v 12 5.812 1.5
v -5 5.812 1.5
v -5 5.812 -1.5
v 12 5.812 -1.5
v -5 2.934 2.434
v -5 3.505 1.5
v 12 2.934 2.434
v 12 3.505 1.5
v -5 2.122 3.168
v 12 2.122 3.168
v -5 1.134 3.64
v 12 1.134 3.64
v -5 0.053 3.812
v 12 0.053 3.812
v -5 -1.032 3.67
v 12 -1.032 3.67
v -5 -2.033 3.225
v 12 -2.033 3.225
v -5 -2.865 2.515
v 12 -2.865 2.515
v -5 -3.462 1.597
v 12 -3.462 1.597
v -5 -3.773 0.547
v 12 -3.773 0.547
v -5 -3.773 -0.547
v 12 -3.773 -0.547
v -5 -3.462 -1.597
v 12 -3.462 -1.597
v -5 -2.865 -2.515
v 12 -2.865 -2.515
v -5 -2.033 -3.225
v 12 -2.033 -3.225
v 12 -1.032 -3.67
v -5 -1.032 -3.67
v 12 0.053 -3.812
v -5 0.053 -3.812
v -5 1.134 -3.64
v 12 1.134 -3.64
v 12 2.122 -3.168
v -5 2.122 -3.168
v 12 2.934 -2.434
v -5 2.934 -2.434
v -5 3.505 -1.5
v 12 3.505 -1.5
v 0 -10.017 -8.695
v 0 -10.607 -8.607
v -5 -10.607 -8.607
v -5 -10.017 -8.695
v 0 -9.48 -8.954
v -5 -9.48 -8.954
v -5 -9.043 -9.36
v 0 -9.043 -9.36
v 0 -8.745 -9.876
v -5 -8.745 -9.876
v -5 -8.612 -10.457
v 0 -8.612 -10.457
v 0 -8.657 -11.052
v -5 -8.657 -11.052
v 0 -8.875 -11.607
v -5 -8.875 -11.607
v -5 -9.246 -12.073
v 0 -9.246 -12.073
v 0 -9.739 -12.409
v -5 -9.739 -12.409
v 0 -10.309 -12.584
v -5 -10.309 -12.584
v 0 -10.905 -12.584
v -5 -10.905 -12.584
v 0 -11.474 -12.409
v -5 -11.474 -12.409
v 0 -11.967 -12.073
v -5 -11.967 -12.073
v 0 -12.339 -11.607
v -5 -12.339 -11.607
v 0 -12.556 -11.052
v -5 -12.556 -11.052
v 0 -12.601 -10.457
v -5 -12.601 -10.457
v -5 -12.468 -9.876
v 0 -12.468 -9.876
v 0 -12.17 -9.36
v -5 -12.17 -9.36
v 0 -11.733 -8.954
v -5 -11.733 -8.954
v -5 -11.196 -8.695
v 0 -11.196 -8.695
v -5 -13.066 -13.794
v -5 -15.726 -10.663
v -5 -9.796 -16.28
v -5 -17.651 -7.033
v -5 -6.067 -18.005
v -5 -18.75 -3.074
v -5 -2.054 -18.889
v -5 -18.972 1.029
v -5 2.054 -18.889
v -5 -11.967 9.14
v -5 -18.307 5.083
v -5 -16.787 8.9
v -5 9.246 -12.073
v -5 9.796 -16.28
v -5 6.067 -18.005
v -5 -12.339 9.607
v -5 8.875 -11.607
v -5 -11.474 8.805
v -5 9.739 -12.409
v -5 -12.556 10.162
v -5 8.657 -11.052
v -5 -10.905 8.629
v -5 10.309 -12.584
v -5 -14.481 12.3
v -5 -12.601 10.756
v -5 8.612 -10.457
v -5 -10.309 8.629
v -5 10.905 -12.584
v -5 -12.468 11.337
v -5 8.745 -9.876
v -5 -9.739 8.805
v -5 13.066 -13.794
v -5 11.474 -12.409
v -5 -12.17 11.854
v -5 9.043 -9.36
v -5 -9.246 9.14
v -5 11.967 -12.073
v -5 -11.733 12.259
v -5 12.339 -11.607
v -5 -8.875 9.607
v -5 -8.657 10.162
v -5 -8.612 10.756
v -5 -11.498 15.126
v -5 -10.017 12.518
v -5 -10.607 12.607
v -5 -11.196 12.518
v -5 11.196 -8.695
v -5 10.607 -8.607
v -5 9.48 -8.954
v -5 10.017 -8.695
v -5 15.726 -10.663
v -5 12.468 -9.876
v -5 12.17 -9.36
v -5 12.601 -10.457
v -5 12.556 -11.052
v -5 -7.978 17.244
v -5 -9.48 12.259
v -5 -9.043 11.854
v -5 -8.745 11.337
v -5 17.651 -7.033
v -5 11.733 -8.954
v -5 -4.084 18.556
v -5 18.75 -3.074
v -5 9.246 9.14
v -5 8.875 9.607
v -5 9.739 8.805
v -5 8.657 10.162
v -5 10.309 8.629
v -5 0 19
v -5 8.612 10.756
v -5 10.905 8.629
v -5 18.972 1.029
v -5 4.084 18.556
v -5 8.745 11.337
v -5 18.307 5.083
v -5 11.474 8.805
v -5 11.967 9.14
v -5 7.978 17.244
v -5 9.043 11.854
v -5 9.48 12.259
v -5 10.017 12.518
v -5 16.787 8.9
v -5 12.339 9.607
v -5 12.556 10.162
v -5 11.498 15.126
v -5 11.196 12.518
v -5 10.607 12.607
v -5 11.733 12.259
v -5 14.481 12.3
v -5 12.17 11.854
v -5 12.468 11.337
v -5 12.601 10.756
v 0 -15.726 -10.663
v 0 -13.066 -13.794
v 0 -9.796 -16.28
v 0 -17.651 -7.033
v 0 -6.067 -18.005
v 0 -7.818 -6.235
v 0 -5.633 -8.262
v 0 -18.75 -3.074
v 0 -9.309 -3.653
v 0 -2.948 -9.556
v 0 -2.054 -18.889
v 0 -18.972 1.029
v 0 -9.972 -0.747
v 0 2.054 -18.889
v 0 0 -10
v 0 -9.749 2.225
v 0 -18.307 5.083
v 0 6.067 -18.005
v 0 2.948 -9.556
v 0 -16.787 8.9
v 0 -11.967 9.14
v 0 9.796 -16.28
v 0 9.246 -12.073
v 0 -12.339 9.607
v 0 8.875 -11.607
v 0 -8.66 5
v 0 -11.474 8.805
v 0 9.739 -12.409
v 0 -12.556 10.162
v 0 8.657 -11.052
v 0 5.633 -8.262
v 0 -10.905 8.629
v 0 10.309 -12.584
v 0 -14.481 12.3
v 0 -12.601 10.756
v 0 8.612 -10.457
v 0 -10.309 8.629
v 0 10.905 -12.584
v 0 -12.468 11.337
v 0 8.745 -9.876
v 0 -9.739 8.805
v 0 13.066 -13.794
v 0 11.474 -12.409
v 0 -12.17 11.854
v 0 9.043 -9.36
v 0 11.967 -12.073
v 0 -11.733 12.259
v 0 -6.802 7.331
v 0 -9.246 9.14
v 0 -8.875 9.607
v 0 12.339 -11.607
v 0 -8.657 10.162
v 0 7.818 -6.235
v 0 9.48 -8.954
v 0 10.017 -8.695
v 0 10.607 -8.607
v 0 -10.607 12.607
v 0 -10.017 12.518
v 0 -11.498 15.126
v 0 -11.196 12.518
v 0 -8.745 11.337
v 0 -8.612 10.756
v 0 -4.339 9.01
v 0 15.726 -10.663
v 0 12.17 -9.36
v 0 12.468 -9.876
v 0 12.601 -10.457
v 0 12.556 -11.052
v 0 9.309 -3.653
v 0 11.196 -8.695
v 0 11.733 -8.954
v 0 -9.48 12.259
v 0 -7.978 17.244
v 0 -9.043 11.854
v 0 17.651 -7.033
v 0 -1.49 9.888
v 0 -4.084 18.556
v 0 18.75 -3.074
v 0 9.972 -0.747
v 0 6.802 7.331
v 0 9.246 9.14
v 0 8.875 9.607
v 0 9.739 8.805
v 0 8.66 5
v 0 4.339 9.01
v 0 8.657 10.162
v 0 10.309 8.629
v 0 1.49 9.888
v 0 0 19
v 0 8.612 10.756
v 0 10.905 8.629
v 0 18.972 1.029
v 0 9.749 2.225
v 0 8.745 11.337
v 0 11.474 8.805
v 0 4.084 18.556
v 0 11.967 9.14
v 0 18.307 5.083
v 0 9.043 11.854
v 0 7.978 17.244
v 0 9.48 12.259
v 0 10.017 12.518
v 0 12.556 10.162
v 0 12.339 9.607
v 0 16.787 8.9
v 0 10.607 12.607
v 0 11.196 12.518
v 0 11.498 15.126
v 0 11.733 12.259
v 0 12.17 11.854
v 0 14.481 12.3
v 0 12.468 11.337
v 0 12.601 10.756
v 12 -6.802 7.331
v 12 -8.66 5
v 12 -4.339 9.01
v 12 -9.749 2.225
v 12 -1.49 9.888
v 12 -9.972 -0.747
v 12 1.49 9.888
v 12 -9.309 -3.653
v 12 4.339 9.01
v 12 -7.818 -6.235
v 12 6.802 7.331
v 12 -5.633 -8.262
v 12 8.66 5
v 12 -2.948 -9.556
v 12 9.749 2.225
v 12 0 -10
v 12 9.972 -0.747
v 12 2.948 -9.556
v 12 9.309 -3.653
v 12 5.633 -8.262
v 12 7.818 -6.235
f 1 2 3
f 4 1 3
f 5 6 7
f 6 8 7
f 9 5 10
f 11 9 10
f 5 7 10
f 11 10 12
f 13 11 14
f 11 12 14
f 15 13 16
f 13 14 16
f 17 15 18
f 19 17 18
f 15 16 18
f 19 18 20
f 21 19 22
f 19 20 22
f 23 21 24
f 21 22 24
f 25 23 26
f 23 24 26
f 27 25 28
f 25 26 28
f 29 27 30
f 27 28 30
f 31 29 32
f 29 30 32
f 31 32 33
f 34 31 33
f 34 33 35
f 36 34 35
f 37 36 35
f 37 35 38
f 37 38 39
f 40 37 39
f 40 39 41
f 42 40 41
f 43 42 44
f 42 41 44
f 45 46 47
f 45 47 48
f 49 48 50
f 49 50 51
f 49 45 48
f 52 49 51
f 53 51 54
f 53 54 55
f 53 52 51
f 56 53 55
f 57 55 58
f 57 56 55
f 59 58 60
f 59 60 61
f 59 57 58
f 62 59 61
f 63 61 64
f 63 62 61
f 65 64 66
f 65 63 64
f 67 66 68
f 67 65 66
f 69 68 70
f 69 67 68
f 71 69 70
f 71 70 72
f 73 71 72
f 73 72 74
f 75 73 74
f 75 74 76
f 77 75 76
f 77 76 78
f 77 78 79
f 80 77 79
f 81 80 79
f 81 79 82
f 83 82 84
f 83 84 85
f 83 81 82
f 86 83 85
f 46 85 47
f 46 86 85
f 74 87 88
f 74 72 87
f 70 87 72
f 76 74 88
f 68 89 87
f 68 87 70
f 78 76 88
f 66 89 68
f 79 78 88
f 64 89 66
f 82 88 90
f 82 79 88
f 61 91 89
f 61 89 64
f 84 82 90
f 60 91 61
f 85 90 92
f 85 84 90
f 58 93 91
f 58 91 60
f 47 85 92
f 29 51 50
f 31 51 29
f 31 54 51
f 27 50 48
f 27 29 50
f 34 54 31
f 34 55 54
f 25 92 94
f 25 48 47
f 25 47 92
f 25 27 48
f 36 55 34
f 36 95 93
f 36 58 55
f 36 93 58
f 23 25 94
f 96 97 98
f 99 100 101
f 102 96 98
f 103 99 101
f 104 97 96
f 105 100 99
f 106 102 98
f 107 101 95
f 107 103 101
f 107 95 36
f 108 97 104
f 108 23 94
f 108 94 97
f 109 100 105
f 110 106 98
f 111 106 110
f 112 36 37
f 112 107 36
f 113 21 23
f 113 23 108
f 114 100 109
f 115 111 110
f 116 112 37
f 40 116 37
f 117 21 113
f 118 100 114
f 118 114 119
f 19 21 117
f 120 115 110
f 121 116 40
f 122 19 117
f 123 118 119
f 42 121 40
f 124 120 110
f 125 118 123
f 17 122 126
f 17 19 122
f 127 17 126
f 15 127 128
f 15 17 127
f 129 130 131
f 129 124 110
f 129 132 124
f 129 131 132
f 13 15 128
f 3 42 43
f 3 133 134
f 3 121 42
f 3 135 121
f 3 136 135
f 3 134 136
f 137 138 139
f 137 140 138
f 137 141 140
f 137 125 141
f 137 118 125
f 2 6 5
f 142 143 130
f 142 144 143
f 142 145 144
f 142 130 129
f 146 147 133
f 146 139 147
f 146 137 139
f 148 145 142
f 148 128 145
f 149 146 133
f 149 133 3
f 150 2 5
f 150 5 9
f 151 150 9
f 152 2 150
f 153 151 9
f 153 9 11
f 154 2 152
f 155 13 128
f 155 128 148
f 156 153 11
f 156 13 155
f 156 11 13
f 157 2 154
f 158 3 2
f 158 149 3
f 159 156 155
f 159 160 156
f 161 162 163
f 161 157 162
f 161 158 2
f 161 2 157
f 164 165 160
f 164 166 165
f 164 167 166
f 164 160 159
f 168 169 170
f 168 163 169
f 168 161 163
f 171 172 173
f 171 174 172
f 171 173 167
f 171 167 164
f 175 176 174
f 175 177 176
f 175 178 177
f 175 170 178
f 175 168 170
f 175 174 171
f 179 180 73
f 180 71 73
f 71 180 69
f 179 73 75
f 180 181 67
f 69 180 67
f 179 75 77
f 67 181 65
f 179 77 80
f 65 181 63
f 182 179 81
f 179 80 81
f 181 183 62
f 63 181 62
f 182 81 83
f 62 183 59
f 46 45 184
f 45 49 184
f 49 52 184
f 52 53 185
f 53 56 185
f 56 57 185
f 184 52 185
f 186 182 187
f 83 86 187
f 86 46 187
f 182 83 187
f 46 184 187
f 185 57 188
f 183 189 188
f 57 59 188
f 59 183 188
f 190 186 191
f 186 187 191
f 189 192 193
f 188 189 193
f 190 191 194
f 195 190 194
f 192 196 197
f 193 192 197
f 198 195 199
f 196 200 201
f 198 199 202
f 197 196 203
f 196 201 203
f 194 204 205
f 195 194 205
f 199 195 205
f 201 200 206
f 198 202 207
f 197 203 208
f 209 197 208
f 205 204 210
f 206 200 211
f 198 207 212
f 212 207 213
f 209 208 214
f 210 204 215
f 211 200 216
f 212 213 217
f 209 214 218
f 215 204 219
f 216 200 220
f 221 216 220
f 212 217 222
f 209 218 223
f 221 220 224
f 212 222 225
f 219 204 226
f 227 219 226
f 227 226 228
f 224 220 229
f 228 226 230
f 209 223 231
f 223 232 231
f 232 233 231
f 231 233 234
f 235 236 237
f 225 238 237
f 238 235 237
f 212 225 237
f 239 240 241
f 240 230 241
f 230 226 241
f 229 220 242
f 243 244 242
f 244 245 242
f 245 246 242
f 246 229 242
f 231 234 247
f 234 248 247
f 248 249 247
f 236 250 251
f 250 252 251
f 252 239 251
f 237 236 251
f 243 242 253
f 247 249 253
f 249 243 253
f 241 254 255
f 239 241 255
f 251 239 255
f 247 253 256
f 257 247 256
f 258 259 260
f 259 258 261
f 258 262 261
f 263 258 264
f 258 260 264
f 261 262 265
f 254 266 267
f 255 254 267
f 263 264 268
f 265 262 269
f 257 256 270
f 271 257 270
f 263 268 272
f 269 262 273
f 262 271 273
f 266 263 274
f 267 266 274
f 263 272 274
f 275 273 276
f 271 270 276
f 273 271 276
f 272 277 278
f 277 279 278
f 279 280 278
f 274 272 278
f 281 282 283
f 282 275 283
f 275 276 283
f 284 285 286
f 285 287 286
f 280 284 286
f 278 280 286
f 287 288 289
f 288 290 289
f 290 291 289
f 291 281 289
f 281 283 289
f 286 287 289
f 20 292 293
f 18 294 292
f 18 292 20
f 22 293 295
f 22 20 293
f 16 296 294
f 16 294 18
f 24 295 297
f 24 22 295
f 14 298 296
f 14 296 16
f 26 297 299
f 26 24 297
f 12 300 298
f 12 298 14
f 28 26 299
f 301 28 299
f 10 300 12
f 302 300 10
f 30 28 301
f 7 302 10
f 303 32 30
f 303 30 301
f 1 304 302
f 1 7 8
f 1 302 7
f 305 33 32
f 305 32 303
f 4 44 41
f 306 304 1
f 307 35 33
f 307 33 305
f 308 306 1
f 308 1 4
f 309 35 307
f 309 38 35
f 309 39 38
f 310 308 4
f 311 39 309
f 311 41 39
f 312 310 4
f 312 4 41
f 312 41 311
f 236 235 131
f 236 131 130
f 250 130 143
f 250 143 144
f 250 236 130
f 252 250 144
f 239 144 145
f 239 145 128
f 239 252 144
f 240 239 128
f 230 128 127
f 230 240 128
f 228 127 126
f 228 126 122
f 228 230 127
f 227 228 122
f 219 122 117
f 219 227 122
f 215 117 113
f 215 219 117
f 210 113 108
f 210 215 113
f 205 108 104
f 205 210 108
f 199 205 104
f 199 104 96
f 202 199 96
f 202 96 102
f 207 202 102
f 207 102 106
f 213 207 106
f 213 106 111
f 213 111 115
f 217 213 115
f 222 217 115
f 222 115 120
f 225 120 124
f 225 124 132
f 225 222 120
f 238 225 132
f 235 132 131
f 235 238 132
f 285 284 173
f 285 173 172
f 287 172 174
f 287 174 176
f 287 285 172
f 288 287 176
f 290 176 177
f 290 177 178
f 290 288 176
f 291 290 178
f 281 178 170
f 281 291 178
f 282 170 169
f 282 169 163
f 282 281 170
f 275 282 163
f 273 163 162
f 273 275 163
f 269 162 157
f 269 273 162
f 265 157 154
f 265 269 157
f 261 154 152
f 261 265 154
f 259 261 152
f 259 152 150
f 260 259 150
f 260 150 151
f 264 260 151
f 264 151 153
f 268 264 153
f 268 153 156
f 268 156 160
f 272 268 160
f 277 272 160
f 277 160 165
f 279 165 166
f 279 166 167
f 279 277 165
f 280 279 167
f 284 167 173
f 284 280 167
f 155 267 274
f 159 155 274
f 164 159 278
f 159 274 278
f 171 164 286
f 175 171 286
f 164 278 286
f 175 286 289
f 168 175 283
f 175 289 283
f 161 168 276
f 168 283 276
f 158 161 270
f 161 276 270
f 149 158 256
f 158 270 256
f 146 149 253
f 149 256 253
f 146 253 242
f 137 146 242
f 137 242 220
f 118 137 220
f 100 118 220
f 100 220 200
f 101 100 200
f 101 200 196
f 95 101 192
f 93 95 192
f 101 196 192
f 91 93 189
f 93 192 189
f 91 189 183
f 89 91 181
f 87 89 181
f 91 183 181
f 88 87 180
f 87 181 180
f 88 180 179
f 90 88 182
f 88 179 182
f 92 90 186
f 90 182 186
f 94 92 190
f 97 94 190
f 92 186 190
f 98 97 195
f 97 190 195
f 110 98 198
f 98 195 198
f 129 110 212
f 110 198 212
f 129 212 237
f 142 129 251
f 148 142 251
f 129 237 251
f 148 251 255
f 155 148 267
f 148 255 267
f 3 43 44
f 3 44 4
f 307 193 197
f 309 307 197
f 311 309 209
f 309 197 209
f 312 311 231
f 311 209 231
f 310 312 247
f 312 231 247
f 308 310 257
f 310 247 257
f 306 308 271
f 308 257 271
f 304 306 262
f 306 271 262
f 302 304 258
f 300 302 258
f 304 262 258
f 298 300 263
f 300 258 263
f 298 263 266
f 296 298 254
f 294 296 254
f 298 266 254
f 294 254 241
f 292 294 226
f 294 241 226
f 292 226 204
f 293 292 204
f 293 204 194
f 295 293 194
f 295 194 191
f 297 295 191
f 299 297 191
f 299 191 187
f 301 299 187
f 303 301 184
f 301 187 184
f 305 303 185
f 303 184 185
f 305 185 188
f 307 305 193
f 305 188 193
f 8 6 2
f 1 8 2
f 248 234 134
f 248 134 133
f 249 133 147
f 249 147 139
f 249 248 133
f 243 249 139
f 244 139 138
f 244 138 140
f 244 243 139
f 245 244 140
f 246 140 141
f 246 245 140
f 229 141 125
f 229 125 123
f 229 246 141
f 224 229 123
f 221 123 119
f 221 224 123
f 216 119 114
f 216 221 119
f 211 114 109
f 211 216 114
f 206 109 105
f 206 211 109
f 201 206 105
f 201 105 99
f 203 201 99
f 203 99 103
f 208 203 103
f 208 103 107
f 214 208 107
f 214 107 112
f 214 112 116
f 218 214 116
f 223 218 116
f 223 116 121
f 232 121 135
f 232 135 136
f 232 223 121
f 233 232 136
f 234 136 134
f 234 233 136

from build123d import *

# Parameters (mm, degrees)
SKETCH1_R        = 10
SMALLRING_DEPTH  = 12
SKETCH4_R        = 19
SKETCH4_R_2      = 2
BIGRING_DEPTH    = 5
SKETCH42_R       = 3.8125
SHAFT_HOLE_DEPTH = 17
SKETCH43_W       = 3
SKETCH43_H       = 4
KEYWAY_DEPTH     = 17


with BuildPart() as part:
    # Sketch1 → SmallRing (new body)
    with BuildSketch(Plane(origin=(0, 0, 0), x_dir=(0, 0, -1), z_dir=(1, 0, 0))):
        Circle(SKETCH1_R)
    extrude(amount=SMALLRING_DEPTH)

    # Sketch4 → BigRing (add)
    with BuildSketch(Plane.ZY):
        Circle(SKETCH4_R)
        with Locations((-10.606601718, 10.606601718)):
            Circle(SKETCH4_R_2, mode=Mode.SUBTRACT)
        with Locations((10.606601718, 10.606601718)):
            Circle(SKETCH4_R_2, mode=Mode.SUBTRACT)
        with Locations((10.606601718, -10.606601718)):
            Circle(SKETCH4_R_2, mode=Mode.SUBTRACT)
        with Locations((-10.606601718, -10.606601718)):
            Circle(SKETCH4_R_2, mode=Mode.SUBTRACT)
    extrude(amount=BIGRING_DEPTH)

    # Sketch42 → Shaft Hole (cut)
    with BuildSketch(Plane(origin=(12, 0, 0), x_dir=(0, 0, -1), z_dir=(1, 0, 0))):
        Circle(SKETCH42_R)
    extrude(amount=-SHAFT_HOLE_DEPTH, mode=Mode.SUBTRACT)

    # Sketch43 → KeyWay (cut)
    with BuildSketch(Plane(origin=(12, 0, 0), x_dir=(0, 0, -1), z_dir=(1, 0, 0))):
        with Locations((0, 3.8125)):
            Rectangle(SKETCH43_W, SKETCH43_H)
    extrude(amount=-KEYWAY_DEPTH, mode=Mode.SUBTRACT)


solid = part.part
